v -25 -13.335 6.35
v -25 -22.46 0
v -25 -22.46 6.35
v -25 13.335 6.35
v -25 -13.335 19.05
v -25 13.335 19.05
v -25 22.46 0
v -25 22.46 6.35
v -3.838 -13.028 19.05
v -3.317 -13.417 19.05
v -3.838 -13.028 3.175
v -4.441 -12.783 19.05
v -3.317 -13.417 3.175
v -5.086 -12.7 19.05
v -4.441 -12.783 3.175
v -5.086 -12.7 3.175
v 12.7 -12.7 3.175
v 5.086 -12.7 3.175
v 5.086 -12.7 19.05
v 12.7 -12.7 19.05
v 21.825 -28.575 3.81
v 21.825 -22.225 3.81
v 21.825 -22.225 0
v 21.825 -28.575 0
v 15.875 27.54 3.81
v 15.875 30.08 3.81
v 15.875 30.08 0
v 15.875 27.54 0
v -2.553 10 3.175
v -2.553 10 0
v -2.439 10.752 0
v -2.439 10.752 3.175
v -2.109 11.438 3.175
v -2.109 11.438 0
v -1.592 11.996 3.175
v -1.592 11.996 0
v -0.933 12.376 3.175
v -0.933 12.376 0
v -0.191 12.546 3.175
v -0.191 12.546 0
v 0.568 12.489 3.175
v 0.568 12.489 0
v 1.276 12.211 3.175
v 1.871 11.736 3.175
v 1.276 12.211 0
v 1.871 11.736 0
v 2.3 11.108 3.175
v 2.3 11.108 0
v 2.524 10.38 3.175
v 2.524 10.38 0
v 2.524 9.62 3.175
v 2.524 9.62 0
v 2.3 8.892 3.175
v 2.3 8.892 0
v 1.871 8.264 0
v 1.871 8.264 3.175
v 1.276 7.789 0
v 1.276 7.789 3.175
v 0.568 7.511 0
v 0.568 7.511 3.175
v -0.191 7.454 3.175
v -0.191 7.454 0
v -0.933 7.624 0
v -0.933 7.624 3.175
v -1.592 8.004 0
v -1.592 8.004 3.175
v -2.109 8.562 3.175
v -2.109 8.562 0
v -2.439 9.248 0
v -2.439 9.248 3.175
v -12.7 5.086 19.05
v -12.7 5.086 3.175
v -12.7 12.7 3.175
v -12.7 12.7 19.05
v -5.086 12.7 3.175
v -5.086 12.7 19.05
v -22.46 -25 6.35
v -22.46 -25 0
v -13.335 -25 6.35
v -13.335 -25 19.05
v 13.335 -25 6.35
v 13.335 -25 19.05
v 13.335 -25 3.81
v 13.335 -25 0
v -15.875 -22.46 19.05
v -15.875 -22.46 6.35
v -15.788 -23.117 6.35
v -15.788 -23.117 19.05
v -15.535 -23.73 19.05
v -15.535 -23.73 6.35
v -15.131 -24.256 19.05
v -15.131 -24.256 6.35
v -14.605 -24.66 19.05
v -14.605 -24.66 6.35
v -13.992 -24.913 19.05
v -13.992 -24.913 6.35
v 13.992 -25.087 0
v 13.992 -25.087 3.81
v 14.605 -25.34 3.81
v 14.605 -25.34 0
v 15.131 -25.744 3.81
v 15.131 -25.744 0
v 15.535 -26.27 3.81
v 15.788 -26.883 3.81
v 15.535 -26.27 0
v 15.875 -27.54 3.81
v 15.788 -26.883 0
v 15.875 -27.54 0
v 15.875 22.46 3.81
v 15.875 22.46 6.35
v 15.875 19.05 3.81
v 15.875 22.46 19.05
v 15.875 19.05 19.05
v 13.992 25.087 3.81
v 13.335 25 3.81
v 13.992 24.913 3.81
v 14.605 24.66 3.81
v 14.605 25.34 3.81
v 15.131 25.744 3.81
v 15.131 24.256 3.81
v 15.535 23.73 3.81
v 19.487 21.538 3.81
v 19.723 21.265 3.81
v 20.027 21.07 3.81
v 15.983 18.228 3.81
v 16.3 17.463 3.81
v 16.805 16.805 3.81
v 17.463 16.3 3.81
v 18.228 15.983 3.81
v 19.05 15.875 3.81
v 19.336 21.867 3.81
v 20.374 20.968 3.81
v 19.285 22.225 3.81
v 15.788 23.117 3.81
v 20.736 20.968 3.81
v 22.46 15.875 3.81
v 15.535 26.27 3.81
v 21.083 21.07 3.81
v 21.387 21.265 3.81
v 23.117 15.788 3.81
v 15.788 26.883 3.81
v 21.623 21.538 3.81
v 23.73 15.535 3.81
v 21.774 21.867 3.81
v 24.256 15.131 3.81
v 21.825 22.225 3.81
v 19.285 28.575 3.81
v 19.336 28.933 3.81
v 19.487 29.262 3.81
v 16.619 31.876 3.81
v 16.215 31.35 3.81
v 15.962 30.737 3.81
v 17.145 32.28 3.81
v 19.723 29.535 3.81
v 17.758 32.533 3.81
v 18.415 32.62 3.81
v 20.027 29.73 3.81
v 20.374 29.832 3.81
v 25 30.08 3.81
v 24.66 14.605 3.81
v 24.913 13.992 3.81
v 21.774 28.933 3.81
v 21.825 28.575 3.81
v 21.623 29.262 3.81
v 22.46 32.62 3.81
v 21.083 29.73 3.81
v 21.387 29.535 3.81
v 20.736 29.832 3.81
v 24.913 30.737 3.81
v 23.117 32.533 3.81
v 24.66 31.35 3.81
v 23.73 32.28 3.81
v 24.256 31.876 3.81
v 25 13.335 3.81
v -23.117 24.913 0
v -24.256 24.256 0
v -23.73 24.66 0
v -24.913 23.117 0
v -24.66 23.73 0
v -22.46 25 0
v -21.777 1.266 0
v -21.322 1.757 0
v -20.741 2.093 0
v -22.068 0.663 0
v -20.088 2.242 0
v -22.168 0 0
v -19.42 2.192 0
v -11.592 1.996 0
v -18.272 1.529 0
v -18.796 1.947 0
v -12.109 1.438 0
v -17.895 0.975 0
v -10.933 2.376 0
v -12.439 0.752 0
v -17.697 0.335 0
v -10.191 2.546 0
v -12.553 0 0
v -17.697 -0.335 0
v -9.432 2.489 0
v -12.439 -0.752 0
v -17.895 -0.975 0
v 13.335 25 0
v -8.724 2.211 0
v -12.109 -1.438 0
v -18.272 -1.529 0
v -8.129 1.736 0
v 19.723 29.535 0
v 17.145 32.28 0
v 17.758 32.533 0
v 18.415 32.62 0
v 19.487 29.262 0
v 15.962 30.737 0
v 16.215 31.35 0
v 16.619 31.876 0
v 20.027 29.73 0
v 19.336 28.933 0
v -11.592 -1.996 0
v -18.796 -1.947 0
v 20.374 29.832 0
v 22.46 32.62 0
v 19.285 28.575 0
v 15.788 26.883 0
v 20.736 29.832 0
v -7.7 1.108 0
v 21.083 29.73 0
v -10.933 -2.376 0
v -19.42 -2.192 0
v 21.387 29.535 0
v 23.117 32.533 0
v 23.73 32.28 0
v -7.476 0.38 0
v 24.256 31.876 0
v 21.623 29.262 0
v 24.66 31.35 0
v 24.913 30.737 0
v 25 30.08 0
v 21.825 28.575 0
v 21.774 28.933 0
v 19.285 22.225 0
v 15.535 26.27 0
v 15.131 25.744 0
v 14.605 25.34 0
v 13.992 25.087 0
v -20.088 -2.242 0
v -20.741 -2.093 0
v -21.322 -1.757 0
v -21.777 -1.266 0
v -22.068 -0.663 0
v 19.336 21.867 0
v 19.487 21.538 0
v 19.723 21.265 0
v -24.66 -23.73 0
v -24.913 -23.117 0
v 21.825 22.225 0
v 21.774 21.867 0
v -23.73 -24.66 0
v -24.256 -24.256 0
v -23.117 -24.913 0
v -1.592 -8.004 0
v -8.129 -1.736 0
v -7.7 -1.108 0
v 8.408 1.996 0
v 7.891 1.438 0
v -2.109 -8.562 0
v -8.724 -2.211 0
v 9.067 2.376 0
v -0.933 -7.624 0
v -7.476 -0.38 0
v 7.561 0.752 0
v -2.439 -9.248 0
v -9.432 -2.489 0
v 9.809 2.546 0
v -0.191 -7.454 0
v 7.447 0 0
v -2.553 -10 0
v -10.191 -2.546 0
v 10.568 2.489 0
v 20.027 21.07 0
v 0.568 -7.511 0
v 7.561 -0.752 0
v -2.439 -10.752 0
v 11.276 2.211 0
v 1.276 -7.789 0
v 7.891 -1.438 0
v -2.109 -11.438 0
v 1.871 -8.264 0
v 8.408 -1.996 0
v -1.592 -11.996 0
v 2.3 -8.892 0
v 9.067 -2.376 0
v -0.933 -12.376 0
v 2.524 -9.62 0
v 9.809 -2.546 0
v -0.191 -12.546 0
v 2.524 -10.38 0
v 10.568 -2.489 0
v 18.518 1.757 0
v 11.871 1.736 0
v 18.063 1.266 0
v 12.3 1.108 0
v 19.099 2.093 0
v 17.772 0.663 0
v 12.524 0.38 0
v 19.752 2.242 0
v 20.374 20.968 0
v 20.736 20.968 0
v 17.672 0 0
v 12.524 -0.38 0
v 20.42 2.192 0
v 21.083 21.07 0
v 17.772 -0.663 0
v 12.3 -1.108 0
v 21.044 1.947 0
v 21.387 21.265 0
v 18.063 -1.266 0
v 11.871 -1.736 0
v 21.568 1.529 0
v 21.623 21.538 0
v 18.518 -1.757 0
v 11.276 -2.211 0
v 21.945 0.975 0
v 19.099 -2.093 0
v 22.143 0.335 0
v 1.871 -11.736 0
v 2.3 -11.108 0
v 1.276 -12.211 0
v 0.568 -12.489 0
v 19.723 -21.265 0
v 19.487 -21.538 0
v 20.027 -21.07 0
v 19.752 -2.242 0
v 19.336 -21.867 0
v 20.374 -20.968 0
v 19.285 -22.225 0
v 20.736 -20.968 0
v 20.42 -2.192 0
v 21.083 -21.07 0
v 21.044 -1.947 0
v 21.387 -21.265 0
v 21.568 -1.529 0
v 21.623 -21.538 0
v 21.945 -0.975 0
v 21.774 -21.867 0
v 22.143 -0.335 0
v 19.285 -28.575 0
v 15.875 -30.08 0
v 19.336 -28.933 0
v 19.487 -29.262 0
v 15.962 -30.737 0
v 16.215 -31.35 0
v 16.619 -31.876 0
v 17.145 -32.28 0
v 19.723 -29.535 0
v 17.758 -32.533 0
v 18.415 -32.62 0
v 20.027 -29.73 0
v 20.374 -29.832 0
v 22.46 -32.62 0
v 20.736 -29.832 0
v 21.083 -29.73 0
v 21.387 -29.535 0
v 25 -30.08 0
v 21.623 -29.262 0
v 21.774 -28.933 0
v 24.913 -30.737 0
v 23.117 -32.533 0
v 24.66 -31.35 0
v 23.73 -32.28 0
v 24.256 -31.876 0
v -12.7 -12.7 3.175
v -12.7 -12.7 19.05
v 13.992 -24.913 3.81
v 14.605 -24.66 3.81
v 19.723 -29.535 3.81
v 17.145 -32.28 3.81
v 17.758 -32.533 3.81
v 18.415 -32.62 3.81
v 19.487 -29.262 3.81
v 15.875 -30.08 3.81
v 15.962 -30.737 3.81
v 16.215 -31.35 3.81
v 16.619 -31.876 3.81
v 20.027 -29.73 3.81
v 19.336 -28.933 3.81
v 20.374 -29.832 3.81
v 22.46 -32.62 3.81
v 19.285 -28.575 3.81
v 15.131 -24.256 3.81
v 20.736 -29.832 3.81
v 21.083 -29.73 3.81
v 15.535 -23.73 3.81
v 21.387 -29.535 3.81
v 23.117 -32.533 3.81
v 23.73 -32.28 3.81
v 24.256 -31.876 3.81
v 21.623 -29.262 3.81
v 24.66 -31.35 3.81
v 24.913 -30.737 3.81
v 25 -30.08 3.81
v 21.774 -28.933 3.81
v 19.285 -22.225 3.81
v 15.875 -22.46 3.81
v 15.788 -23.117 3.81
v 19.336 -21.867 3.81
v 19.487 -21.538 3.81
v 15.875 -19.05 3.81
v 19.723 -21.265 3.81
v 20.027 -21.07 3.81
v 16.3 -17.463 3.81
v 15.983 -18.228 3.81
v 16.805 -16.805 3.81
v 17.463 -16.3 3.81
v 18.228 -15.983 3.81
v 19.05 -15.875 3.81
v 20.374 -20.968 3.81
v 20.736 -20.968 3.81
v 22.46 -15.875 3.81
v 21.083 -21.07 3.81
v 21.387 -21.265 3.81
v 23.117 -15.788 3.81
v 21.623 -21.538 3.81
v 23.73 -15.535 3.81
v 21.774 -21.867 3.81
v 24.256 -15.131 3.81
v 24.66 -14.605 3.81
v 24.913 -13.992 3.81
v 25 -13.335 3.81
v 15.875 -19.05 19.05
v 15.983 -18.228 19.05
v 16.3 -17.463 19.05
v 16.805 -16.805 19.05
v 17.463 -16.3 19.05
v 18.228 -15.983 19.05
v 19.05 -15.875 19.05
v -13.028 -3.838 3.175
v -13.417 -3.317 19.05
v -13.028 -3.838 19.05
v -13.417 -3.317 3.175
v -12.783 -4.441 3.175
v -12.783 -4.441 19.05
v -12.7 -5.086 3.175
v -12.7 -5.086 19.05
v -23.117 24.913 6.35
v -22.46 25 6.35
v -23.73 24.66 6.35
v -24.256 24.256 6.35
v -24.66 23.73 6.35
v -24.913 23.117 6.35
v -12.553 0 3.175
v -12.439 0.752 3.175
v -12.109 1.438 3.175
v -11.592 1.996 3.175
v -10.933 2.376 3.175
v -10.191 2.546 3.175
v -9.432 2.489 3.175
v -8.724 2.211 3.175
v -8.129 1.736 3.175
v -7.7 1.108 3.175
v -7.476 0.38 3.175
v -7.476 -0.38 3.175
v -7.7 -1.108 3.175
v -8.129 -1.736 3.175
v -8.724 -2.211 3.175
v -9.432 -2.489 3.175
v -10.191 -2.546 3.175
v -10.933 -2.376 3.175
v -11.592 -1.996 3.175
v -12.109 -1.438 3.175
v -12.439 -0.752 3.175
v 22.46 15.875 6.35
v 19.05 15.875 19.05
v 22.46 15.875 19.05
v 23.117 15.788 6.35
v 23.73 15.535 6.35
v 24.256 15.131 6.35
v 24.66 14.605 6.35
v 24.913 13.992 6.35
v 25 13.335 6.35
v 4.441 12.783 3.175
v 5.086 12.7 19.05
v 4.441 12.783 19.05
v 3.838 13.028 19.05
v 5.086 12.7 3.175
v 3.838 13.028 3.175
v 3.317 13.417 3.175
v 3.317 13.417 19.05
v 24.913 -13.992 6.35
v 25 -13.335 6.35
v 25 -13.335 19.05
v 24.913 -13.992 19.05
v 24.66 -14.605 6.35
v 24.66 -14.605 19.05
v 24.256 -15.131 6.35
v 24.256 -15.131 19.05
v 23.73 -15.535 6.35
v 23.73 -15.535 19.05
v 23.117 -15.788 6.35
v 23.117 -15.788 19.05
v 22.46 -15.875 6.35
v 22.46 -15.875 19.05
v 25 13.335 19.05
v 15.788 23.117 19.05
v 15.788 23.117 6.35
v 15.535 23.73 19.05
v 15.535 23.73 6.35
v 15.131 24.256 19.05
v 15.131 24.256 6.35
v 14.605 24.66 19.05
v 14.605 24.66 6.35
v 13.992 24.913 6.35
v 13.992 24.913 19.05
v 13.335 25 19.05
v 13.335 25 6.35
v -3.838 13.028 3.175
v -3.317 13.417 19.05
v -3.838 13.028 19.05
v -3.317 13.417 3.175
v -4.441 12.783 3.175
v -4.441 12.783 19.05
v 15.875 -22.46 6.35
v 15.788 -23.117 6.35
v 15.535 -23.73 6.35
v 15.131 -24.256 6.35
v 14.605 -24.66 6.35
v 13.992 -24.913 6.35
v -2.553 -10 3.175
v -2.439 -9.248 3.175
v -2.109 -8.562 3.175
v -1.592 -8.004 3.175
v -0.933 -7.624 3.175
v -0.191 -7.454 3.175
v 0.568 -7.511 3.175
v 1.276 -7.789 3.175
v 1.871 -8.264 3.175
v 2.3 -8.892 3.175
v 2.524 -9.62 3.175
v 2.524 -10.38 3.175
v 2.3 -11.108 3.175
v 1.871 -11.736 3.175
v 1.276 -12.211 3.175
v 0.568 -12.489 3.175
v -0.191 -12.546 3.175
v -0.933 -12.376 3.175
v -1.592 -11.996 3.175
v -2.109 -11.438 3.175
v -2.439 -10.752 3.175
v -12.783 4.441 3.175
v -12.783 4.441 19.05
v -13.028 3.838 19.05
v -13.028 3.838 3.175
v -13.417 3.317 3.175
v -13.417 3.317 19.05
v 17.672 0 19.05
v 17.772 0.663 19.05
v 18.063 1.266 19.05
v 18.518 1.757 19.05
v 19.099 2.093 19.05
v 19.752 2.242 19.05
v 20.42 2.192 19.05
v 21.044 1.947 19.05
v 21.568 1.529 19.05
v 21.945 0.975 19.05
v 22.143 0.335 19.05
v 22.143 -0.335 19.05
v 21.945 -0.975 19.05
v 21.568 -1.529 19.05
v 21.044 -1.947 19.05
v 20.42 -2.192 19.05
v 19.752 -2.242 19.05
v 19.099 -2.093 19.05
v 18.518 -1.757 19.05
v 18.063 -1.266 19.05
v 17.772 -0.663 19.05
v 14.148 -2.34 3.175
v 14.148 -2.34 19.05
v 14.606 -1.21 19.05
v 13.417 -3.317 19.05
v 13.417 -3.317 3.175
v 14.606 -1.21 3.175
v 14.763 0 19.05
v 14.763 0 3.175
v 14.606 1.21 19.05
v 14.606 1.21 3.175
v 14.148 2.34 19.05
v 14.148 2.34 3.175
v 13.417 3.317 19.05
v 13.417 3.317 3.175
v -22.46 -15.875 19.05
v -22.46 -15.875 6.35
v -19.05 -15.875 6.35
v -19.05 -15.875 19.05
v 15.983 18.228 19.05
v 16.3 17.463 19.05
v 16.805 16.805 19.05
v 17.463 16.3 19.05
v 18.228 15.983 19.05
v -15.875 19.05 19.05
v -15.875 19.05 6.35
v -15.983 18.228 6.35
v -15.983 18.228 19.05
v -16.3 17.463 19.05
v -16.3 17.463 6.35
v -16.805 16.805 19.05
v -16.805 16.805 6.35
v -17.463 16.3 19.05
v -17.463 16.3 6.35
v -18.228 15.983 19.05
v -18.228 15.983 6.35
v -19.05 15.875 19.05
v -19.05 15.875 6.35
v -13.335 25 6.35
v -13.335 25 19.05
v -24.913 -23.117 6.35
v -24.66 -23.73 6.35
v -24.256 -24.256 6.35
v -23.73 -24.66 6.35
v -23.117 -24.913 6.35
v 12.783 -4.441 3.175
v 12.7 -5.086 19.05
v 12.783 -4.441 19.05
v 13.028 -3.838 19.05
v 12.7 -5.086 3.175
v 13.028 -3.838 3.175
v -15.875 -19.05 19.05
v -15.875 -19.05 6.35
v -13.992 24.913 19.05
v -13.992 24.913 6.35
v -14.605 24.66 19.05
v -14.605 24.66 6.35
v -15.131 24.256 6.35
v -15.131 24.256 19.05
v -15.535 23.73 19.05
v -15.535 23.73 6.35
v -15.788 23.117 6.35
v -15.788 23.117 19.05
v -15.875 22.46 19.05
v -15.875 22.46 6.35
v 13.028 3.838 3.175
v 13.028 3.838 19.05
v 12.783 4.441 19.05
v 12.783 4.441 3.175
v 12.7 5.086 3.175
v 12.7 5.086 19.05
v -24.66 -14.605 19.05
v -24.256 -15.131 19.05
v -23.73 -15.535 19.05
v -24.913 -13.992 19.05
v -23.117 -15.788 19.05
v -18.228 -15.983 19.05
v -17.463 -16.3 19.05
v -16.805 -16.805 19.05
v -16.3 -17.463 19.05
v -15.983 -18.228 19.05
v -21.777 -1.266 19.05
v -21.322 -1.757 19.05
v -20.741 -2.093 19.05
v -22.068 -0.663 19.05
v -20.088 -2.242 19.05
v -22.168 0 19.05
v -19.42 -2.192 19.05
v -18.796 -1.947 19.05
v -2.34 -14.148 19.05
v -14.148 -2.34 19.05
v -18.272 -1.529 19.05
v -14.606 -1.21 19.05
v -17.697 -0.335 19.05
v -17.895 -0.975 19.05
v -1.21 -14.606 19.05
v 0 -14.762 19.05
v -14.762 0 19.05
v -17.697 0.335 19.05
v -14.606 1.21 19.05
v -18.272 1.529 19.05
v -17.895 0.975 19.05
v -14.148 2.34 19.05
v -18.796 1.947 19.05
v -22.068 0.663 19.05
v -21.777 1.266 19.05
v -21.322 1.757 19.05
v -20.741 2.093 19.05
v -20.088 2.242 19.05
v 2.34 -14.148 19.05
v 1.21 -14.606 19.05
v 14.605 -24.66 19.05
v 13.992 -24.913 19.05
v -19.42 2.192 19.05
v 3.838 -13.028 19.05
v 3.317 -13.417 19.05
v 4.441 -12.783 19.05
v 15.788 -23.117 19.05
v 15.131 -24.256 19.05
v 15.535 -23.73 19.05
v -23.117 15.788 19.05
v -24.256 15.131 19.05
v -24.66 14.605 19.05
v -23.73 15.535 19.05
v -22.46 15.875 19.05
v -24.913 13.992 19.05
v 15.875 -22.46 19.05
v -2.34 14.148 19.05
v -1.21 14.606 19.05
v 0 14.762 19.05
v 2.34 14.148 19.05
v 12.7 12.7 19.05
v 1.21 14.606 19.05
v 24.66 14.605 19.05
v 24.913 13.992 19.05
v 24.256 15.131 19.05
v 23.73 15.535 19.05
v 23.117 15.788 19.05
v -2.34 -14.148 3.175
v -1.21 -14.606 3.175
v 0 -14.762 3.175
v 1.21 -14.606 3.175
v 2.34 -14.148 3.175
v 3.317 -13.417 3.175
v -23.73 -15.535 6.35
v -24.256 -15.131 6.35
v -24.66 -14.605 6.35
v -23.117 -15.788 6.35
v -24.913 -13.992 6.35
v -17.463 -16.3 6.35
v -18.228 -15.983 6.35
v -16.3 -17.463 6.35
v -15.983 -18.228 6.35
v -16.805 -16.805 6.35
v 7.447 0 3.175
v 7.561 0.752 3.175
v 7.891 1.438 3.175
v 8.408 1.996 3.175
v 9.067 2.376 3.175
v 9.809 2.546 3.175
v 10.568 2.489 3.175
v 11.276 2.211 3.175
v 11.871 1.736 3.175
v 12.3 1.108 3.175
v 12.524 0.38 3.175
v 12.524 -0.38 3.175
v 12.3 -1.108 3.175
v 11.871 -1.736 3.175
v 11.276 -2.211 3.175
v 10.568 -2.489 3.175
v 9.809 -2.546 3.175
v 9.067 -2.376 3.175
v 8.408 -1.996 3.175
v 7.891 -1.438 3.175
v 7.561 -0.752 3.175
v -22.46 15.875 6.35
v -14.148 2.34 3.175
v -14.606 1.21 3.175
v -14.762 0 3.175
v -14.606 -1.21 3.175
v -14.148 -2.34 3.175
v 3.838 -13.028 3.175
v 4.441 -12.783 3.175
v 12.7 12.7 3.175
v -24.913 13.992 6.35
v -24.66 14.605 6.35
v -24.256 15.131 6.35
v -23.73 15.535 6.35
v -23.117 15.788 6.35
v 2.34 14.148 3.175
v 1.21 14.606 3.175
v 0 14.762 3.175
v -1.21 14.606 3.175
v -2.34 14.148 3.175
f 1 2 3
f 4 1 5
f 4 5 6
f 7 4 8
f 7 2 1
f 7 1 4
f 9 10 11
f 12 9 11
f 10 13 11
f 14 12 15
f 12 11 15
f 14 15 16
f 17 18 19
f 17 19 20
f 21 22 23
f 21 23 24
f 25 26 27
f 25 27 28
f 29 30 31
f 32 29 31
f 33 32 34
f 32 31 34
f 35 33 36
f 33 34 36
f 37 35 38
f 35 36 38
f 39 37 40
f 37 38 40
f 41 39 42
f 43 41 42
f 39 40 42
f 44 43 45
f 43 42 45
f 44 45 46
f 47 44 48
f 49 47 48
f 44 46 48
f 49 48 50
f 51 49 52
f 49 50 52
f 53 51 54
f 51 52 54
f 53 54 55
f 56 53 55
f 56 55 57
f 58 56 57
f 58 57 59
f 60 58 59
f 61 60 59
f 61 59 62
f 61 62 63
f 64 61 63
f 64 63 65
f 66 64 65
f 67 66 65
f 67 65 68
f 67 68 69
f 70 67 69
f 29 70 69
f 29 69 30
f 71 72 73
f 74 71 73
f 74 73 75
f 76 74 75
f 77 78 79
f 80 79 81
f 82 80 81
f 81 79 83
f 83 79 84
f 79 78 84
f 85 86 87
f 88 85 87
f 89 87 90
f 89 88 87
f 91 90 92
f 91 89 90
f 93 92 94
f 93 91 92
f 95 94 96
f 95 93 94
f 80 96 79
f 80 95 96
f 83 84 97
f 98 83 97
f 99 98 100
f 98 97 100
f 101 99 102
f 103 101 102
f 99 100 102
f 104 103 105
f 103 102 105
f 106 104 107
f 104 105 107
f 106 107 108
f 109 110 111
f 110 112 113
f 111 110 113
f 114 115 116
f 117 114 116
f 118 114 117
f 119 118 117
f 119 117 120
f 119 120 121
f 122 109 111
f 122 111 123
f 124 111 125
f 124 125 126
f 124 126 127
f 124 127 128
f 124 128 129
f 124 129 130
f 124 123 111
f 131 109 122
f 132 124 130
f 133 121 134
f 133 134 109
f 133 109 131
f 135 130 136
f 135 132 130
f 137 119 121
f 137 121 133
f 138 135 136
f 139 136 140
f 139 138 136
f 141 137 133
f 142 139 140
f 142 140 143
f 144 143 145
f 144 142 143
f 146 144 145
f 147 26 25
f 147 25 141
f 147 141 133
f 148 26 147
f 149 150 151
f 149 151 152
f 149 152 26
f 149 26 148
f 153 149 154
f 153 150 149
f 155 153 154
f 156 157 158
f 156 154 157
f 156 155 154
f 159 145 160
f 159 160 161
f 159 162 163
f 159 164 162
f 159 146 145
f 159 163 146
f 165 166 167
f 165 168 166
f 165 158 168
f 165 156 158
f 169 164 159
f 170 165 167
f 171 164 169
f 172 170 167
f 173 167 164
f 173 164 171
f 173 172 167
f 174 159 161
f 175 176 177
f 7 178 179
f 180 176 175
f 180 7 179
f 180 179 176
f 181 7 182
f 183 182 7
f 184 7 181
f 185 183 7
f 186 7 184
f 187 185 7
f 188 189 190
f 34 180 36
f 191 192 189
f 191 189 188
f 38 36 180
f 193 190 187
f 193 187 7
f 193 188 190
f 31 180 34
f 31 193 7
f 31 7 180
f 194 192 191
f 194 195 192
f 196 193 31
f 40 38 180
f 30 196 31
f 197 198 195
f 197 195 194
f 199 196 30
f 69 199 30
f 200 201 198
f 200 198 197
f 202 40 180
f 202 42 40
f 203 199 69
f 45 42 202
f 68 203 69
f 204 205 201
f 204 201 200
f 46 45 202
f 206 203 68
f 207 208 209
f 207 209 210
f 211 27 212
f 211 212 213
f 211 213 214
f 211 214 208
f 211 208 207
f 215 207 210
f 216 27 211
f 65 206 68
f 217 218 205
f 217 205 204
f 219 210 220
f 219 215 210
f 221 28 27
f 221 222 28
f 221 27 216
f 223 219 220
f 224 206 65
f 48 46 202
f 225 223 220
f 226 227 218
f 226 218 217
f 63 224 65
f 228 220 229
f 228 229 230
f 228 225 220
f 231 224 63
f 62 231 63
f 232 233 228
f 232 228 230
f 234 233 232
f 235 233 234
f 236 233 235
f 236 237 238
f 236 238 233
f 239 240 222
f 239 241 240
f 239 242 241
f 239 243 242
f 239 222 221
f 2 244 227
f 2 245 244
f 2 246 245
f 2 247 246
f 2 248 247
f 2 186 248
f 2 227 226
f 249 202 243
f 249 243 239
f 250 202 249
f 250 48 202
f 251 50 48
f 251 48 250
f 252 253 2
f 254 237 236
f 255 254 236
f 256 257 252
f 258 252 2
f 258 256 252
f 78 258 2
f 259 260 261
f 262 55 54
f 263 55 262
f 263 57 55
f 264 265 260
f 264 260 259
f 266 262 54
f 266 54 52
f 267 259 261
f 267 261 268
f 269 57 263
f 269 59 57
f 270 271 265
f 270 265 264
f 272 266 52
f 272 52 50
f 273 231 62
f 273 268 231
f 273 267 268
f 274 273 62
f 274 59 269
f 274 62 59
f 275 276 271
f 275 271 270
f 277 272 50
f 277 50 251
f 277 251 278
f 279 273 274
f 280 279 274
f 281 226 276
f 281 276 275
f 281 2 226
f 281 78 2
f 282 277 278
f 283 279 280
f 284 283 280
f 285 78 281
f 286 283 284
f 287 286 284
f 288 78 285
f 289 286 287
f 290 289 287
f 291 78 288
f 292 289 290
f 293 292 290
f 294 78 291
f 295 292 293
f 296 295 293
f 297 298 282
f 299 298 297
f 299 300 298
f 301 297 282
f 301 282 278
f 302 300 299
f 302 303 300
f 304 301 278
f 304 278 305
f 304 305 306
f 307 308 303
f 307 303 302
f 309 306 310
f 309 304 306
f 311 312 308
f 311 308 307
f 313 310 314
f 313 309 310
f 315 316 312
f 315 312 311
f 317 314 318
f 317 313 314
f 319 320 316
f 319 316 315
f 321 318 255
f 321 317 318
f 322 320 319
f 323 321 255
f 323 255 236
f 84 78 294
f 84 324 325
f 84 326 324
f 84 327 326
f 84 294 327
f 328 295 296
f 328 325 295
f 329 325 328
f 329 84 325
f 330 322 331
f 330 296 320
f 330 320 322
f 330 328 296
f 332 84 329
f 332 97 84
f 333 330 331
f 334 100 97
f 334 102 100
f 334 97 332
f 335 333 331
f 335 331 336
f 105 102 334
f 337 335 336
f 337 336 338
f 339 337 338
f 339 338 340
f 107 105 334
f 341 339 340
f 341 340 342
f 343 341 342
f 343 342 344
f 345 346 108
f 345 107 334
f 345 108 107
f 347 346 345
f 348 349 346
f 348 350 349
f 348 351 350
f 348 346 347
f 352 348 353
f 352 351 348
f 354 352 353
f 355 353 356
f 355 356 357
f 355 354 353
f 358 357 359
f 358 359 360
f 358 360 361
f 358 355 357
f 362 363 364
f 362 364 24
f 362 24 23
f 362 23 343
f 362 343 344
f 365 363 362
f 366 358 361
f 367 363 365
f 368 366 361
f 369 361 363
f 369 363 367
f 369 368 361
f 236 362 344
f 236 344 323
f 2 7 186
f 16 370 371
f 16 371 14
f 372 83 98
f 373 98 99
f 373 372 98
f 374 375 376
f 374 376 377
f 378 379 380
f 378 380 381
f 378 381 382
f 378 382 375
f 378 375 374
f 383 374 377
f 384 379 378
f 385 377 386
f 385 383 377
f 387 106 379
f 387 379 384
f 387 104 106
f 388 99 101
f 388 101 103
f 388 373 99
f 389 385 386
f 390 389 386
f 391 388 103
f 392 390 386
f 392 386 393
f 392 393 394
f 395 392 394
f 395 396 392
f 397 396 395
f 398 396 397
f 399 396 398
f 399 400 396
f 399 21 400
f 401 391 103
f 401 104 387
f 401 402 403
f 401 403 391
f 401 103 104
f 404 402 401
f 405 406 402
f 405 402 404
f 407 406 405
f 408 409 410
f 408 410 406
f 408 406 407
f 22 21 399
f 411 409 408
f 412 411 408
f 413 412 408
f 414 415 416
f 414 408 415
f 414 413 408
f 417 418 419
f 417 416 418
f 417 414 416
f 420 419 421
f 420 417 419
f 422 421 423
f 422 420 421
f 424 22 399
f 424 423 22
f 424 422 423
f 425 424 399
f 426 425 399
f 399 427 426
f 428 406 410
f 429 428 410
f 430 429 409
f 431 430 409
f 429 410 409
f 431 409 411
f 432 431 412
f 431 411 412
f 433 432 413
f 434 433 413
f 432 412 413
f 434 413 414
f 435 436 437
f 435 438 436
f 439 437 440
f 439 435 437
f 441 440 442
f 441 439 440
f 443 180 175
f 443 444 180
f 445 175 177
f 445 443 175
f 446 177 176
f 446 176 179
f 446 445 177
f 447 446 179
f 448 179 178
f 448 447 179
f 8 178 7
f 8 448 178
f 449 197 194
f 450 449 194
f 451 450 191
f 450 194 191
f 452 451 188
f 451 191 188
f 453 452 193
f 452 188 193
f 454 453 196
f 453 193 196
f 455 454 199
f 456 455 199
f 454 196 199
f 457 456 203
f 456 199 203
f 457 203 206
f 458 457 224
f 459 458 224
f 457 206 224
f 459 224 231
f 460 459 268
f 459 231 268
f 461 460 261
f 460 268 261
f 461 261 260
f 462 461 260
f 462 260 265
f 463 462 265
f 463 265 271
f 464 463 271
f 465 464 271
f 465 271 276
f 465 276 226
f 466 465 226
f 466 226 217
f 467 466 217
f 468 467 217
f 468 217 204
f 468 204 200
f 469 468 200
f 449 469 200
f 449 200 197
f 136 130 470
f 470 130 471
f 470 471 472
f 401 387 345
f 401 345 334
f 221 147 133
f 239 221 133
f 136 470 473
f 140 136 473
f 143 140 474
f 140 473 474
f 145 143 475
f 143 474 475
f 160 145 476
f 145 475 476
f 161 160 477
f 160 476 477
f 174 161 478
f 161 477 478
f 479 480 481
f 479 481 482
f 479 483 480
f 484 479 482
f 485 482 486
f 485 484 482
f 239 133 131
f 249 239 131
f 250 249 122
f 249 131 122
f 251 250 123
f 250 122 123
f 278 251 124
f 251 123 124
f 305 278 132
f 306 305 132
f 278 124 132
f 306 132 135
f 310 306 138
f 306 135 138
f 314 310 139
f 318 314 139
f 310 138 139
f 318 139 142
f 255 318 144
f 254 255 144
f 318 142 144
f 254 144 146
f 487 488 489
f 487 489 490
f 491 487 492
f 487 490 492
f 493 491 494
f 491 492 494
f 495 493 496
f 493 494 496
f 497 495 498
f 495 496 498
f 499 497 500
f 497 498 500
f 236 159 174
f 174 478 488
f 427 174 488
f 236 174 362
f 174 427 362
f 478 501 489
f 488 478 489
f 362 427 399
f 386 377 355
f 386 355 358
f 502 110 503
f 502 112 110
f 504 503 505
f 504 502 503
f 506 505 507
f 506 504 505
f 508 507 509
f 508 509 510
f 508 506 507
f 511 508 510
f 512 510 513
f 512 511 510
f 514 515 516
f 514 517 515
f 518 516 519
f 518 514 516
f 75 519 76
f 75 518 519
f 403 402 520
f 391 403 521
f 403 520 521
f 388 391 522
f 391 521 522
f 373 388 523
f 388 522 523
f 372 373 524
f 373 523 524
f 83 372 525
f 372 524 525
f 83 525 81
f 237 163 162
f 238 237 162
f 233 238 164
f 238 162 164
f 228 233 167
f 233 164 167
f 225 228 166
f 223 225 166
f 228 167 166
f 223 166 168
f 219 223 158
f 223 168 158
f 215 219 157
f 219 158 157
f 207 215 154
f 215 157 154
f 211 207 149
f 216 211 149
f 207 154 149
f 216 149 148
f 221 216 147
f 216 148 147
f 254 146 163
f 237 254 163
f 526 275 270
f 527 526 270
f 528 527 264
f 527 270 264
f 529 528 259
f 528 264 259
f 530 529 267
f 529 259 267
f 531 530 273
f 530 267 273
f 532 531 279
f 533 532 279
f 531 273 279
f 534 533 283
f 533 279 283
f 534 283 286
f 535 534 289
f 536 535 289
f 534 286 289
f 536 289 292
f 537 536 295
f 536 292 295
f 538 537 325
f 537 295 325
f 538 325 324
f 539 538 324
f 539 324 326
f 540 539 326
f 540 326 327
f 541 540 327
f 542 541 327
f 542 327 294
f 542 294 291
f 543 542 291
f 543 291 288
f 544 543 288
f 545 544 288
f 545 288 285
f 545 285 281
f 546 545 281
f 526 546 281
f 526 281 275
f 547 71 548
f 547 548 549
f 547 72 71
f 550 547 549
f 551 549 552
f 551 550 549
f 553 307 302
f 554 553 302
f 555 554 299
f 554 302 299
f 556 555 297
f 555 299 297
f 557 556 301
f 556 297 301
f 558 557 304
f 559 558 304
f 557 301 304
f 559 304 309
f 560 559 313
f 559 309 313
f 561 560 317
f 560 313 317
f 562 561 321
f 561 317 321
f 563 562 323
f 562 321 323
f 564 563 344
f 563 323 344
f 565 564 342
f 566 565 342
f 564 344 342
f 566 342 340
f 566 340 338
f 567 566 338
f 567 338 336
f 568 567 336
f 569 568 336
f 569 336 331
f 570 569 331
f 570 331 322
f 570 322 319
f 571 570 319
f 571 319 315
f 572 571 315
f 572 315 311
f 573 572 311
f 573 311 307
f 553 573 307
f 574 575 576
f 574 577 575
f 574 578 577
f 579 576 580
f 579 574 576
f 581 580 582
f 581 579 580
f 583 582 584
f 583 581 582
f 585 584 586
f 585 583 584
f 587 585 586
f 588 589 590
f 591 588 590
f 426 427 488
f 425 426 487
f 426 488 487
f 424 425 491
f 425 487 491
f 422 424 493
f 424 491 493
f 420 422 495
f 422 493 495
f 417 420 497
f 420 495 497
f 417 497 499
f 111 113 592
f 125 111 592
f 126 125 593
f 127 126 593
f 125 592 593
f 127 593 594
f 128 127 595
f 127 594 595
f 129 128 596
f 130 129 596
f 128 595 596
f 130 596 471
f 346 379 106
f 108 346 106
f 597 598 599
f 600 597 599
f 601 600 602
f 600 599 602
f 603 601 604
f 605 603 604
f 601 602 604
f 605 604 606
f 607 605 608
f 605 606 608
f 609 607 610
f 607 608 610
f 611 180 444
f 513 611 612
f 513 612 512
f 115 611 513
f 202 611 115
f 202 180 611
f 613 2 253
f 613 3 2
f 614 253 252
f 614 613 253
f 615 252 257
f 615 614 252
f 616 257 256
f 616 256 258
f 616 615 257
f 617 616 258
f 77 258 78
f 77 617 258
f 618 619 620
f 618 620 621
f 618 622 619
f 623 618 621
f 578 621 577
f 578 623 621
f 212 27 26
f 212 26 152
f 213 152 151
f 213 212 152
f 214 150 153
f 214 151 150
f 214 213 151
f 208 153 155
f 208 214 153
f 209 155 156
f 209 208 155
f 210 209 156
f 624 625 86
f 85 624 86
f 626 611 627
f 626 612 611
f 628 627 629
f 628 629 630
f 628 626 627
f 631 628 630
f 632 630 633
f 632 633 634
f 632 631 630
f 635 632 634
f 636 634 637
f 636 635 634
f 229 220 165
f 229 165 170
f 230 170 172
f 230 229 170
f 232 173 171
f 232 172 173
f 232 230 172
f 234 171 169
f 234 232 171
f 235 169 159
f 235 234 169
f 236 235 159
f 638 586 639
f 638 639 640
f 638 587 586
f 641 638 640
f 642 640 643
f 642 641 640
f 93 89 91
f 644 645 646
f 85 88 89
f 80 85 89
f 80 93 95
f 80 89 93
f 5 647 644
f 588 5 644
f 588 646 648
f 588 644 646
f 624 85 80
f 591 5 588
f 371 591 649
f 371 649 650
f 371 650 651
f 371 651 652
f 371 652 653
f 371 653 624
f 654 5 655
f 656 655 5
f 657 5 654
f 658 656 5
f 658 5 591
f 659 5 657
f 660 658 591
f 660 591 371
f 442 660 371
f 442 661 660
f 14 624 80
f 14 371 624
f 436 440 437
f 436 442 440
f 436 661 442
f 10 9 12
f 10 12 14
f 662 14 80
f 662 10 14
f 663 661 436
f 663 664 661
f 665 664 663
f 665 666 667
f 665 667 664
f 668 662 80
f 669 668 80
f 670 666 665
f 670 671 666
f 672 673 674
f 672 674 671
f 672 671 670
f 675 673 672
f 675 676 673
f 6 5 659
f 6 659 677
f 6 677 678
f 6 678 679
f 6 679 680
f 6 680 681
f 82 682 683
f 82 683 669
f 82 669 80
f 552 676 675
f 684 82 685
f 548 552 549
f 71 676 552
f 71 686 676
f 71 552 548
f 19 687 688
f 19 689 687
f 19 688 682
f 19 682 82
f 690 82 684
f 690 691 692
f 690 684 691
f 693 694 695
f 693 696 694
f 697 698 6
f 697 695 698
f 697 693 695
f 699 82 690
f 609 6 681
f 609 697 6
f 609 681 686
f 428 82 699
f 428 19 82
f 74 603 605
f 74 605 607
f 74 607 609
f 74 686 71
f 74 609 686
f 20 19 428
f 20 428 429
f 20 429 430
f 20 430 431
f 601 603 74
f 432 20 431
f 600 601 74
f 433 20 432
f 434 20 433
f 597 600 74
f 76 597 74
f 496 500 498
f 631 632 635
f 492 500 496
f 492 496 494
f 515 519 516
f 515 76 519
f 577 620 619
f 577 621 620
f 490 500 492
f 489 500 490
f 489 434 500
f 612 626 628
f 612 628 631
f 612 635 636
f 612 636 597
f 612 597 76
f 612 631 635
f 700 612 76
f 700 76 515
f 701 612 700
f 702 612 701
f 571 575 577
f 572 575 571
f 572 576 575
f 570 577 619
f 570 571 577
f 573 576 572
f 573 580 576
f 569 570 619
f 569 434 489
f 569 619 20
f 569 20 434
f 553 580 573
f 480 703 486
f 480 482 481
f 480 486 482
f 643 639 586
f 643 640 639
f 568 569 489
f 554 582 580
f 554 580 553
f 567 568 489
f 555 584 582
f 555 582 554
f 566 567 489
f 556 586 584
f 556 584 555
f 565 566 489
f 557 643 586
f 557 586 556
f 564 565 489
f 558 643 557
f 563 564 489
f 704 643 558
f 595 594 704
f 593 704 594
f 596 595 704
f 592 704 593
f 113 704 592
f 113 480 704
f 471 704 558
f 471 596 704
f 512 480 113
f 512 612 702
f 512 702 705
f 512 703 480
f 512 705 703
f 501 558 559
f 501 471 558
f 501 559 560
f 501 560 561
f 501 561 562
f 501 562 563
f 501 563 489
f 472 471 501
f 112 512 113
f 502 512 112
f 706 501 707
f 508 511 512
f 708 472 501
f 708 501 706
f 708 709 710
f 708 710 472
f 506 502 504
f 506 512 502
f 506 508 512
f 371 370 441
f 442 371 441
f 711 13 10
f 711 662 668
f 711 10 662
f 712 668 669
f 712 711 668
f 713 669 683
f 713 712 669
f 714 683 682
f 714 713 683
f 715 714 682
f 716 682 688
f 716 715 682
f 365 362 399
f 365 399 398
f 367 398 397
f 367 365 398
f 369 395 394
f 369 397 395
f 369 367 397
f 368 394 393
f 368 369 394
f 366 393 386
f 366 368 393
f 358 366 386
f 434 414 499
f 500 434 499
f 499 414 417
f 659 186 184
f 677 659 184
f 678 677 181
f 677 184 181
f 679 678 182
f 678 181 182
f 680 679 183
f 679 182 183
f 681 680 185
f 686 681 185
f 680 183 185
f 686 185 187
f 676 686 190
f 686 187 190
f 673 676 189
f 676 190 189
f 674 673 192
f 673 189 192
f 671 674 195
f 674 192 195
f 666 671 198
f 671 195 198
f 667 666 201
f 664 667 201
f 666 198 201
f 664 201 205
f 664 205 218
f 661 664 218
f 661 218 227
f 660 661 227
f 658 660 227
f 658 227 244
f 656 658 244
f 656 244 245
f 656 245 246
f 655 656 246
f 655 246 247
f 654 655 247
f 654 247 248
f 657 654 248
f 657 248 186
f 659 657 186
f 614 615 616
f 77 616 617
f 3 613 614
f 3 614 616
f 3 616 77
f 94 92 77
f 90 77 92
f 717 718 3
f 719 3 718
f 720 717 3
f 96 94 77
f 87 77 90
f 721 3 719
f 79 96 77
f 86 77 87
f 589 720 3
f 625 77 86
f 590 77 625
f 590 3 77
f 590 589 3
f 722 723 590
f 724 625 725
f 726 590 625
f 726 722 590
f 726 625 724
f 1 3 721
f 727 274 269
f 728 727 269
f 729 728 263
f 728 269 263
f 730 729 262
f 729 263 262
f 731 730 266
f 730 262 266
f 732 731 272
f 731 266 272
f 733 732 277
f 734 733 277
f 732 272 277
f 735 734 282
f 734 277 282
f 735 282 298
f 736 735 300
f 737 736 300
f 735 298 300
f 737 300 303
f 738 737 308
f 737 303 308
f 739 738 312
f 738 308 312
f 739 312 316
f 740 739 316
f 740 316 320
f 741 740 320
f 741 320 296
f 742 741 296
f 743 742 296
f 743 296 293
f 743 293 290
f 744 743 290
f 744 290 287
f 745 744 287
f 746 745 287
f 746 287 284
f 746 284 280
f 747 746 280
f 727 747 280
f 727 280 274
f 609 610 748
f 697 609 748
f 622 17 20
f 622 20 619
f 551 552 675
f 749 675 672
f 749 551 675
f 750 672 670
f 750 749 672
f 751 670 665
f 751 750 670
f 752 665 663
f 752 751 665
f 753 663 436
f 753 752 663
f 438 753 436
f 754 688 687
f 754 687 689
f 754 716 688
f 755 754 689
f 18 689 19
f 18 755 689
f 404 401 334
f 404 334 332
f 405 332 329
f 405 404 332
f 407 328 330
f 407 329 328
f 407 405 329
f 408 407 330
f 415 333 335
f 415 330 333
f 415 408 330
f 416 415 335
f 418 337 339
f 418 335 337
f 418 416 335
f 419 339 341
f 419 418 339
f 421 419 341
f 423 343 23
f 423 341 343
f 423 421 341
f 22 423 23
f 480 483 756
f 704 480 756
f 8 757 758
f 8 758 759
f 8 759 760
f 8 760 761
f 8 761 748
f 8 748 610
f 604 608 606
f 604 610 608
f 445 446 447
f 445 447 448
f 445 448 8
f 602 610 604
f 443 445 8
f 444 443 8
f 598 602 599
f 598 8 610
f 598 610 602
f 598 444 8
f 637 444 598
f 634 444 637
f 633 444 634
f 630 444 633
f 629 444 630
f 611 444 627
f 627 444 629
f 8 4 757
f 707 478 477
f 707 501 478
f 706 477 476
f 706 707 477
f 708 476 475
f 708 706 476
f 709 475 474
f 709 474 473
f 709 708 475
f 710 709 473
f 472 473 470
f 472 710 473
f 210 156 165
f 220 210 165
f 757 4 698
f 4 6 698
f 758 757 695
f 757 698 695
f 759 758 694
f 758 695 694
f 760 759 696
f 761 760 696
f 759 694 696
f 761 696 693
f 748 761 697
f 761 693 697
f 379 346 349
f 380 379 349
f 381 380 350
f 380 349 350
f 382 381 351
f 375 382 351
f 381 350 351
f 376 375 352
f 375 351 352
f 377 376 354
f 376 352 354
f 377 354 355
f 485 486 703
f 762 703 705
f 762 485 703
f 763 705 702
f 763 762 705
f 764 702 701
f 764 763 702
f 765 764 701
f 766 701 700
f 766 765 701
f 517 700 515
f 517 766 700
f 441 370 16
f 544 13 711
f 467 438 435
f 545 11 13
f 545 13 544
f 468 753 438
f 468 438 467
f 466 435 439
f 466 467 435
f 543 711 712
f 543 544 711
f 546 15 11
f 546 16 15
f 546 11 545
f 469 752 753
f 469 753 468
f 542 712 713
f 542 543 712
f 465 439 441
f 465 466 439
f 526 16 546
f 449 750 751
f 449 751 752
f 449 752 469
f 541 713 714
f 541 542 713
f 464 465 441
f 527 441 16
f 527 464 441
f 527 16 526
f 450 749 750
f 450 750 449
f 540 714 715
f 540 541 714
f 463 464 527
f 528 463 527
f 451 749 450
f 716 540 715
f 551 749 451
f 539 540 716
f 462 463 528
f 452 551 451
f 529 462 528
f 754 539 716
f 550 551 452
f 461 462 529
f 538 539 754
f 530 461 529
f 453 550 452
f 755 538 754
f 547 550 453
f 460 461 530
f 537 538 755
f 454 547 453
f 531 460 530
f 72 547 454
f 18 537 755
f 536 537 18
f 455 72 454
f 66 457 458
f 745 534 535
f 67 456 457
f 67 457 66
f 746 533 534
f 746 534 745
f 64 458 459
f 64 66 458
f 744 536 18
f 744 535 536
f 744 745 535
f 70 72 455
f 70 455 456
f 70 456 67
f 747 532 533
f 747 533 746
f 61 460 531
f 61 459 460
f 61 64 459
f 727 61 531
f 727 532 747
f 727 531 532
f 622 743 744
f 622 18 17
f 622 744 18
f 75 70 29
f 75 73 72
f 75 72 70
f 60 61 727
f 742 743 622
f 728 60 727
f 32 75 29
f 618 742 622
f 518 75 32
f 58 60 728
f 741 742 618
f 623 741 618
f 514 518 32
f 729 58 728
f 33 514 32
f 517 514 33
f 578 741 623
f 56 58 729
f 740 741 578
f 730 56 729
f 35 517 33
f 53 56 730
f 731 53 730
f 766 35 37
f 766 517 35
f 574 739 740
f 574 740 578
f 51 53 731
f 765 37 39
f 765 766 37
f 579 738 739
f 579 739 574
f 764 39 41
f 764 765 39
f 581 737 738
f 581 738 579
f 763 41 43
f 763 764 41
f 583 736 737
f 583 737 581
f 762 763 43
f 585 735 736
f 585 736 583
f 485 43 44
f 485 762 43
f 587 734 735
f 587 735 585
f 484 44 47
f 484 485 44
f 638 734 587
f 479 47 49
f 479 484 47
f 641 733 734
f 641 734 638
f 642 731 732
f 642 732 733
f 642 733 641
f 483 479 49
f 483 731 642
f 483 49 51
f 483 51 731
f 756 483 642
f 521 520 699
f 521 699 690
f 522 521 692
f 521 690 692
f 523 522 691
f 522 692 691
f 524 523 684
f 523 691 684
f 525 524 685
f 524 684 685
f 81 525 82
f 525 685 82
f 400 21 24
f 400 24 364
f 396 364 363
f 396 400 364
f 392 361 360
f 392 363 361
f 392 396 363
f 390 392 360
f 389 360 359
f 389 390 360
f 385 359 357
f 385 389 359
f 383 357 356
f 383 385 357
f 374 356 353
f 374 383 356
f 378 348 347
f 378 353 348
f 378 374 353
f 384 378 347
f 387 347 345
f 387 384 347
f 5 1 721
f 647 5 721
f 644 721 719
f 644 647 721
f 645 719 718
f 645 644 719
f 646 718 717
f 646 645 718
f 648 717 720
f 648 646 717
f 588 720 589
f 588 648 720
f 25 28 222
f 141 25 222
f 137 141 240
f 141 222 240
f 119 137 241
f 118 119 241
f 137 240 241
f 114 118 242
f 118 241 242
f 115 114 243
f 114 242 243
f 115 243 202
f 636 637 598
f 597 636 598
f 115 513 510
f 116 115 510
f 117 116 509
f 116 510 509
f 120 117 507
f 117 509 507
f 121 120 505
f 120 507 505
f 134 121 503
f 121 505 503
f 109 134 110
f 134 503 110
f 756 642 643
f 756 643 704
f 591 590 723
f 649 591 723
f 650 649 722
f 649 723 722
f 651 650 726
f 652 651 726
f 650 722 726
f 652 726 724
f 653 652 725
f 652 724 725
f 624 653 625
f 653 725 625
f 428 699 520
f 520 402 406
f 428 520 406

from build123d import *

# Parameters (mm, degrees)
SKETCH1_W              = 50
SKETCH1_H              = 50
BOSS_EXTRUDE1_DEPTH    = 6.35
SKETCH6_W              = 25.4
SKETCH6_H              = 25.4
BOSS_EXTRUDE3_DEPTH    = 12.7
SKETCH10_W             = 25.4
SKETCH10_H             = 25.4
CUT_EXTRUDE2_DEPTH     = 15.875
FILLET3_R              = 2.54
SKETCH11_W             = 9.125
SKETCH11_H             = 7.62
BOSS_EXTRUDE4_DEPTH    = 6.35
FILLET4_R              = 2.54
CUT_EXTRUDE3_DEPTH     = 7.35
FILLET4_OF_MIRROR1_R   = 2.54
FILLET5_R              = 2.54
CUT_EXTRUDE4_DEPTH     = 2.54
SKETCH14_R             = 4.7625
CUT_EXTRUDE5_DEPTH     = 16.875
FILLET6_R              = 2.54
F_10_CLEARANCE_HOLE1_D = 5.1054
F_8_CLEARANCE_HOLE1_D  = 4.4958


with BuildPart() as part:
    # Sketch1 → Boss-Extrude1 (new body)
    with BuildSketch(Plane.XY):
        Rectangle(SKETCH1_W, SKETCH1_H)
    extrude(amount=BOSS_EXTRUDE1_DEPTH)

    # Sketch6 → Boss-Extrude3 (add)
    with BuildSketch(Plane.XY.offset(6.35)):
        with BuildLine():
            Line((15.875, 19.05), (15.875, 25))
            Line((15.875, 25), (-15.875, 25))
            Line((-15.875, 25), (-15.875, 19.05))
            ThreePointArc((-15.875, 19.05), (-16.80493597, 16.80493597), (-19.05, 15.875))
            Line((-19.05, 15.875), (-25, 15.875))
            Line((-25, 15.875), (-25, -15.875))
            Line((-25, -15.875), (-19.05, -15.875))
            ThreePointArc((-19.05, -15.875), (-16.80493597, -16.80493597), (-15.875, -19.05))
            Line((-15.875, -19.05), (-15.875, -25))
            Line((-15.875, -25), (15.875, -25))
            Line((15.875, -25), (15.875, -19.05))
            ThreePointArc((15.875, -19.05), (16.80493597, -16.80493597), (19.05, -15.875))
            Line((19.05, -15.875), (25, -15.875))
            Line((25, -15.875), (25, 15.875))
            Line((25, 15.875), (19.05, 15.875))
            ThreePointArc((19.05, 15.875), (16.80493597, 16.80493597), (15.875, 19.05))
        make_face()
        Rectangle(SKETCH6_W, SKETCH6_H, mode=Mode.SUBTRACT)
    extrude(amount=BOSS_EXTRUDE3_DEPTH)

    # Sketch10 → Cut-Extrude2 (cut)
    with BuildSketch(Plane.XY.offset(19.05)):
        Rectangle(SKETCH10_W, SKETCH10_H)
    extrude(amount=-CUT_EXTRUDE2_DEPTH, mode=Mode.SUBTRACT)

    # Fillet3
    fillet3_edges = [part.edges().sort_by_distance(p)[0] for p in [
        (-15.875, -25, 12.7),
        (15.875, -25, 12.7),
        (25, -15.875, 12.7),
        (25, 15.875, 12.7),
        (15.875, 25, 12.7),
        (-15.875, 25, 12.7),
        (-25, 15.875, 12.7),
        (-25, -15.875, 12.7),
    ]]
    fillet(fillet3_edges, radius=FILLET3_R)

    # Sketch11 → Boss-Extrude4 (add)
    with BuildSketch(Plane.XY.offset(6.35)):
        with Locations((20.4375, -28.81)):
            Rectangle(SKETCH11_W, SKETCH11_H)
    boss_extrude4 = extrude(amount=-BOSS_EXTRUDE4_DEPTH)

    # Fillet4
    fillet4_edges = [part.edges().sort_by_distance(p)[0] for p in [
        (25, -32.62, 3.175),
        (15.875, -32.62, 3.175),
    ]]
    fillet(fillet4_edges, radius=FILLET4_R)

    # Sketch12 → Cut-Extrude3 (cut, through all)
    with BuildSketch(Plane.XY.offset(6.35)):
        with BuildLine():
            Line((19.285, -28.575), (19.285, -22.225))
            ThreePointArc((19.285, -22.225), (20.555, -20.955), (21.825, -22.225))
            Line((21.825, -22.225), (21.825, -28.575))
            ThreePointArc((21.825, -28.575), (20.555, -29.845), (19.285, -28.575))
        make_face()
    cut_extrude3 = extrude(amount=-CUT_EXTRUDE3_DEPTH, mode=Mode.SUBTRACT)

    # Mirror1: Boss-Extrude4, Cut-Extrude3 across plane
    add(boss_extrude4.mirror(Plane.ZX))
    add(cut_extrude3.mirror(Plane.ZX), mode=Mode.SUBTRACT)

    # Fillet4 of Mirror1
    fillet4_of_mirror1_edges = [part.edges().sort_by_distance(p)[0] for p in [
        (25, 32.62, 3.175),
        (15.875, 32.62, 3.175),
    ]]
    fillet(fillet4_of_mirror1_edges, radius=FILLET4_OF_MIRROR1_R)

    # Fillet5
    fillet5_edges = [part.edges().sort_by_distance(p)[0] for p in [
        (15.875, -25, 3.175),
        (15.875, 25, 3.175),
        (-25, 25, 3.175),
        (-25, -25, 3.175),
    ]]
    fillet(fillet5_edges, radius=FILLET5_R)

    # Sketch13 → Cut-Extrude4 (cut)
    with BuildSketch(Plane.XY.offset(6.35)):
        with BuildLine():
            Line((22.46, 32.62), (18.415, 32.62))
            ThreePointArc((18.415, 32.62), (16.618948776, 31.876051224), (15.875, 30.08))
            Line((15.875, 30.08), (15.875, 27.54))
            ThreePointArc((15.875, 27.54), (15.131051224, 25.743948776), (13.335, 25))
            ThreePointArc((13.335, 25), (15.131051224, 24.256051224), (15.875, 22.46))
            Line((15.875, 22.46), (15.875, 19.05))
            ThreePointArc((15.875, 19.05), (16.80493597, 16.80493597), (19.05, 15.875))
            Line((19.05, 15.875), (22.46, 15.875))
            ThreePointArc((22.46, 15.875), (24.256051224, 15.131051224), (25, 13.335))
            Line((25, 13.335), (25, 30.08))
            ThreePointArc((25, 30.08), (24.256051224, 31.876051224), (22.46, 32.62))
        make_face()
        with BuildLine():
            Line((15.875, -27.54), (15.875, -30.08))
            ThreePointArc((15.875, -30.08), (16.618948776, -31.876051224), (18.415, -32.62))
            Line((18.415, -32.62), (22.46, -32.62))
            ThreePointArc((22.46, -32.62), (24.256051224, -31.876051224), (25, -30.08))
            Line((25, -30.08), (25, -13.335))
            ThreePointArc((25, -13.335), (24.256051224, -15.131051224), (22.46, -15.875))
            Line((22.46, -15.875), (19.05, -15.875))
            ThreePointArc((19.05, -15.875), (16.80493597, -16.80493597), (15.875, -19.05))
            Line((15.875, -19.05), (15.875, -22.46))
            ThreePointArc((15.875, -22.46), (15.131051224, -24.256051224), (13.335, -25))
            ThreePointArc((13.335, -25), (15.131051224, -25.743948776), (15.875, -27.54))
        make_face()
    extrude(amount=-CUT_EXTRUDE4_DEPTH, mode=Mode.SUBTRACT)

    # Sketch14 → Cut-Extrude5 (cut, through all)
    with BuildSketch(Plane.XY.offset(3.175)):
        with Locations((-10, 0)):
            Circle(SKETCH14_R)
        with Locations((0, -10)):
            Circle(SKETCH14_R)
        with Locations((10, 0)):
            Circle(SKETCH14_R)
        with Locations((0, 10)):
            Circle(SKETCH14_R)
    extrude(amount=CUT_EXTRUDE5_DEPTH, mode=Mode.SUBTRACT)

    # Fillet6
    fillet6_edges = [part.edges().sort_by_distance(p)[0] for p in [
        (-12.7, 3.923188276, 11.1125),
        (-12.7, -3.923188276, 11.1125),
        (-3.923188276, -12.7, 11.1125),
        (3.923188276, -12.7, 11.1125),
        (12.7, 3.923188276, 11.1125),
        (12.7, -3.923188276, 11.1125),
        (-3.923188276, 12.7, 11.1125),
        (3.923188276, 12.7, 11.1125),
    ]]
    fillet(fillet6_edges, radius=FILLET6_R)

    # #10 Clearance Hole1 (through all)
    with Locations(Plane.XY.offset(3.175)):
        with Locations((-10, 0), (0, 10), (10, 0), (0, -10)):
            Hole(F_10_CLEARANCE_HOLE1_D / 2)

    # #8 Clearance Hole1 (through all)
    with Locations(Plane.XY.offset(19.05)):
        with Locations((-19.92, 0), (19.92, 0)):
            Hole(F_8_CLEARANCE_HOLE1_D / 2)


solid = part.part
